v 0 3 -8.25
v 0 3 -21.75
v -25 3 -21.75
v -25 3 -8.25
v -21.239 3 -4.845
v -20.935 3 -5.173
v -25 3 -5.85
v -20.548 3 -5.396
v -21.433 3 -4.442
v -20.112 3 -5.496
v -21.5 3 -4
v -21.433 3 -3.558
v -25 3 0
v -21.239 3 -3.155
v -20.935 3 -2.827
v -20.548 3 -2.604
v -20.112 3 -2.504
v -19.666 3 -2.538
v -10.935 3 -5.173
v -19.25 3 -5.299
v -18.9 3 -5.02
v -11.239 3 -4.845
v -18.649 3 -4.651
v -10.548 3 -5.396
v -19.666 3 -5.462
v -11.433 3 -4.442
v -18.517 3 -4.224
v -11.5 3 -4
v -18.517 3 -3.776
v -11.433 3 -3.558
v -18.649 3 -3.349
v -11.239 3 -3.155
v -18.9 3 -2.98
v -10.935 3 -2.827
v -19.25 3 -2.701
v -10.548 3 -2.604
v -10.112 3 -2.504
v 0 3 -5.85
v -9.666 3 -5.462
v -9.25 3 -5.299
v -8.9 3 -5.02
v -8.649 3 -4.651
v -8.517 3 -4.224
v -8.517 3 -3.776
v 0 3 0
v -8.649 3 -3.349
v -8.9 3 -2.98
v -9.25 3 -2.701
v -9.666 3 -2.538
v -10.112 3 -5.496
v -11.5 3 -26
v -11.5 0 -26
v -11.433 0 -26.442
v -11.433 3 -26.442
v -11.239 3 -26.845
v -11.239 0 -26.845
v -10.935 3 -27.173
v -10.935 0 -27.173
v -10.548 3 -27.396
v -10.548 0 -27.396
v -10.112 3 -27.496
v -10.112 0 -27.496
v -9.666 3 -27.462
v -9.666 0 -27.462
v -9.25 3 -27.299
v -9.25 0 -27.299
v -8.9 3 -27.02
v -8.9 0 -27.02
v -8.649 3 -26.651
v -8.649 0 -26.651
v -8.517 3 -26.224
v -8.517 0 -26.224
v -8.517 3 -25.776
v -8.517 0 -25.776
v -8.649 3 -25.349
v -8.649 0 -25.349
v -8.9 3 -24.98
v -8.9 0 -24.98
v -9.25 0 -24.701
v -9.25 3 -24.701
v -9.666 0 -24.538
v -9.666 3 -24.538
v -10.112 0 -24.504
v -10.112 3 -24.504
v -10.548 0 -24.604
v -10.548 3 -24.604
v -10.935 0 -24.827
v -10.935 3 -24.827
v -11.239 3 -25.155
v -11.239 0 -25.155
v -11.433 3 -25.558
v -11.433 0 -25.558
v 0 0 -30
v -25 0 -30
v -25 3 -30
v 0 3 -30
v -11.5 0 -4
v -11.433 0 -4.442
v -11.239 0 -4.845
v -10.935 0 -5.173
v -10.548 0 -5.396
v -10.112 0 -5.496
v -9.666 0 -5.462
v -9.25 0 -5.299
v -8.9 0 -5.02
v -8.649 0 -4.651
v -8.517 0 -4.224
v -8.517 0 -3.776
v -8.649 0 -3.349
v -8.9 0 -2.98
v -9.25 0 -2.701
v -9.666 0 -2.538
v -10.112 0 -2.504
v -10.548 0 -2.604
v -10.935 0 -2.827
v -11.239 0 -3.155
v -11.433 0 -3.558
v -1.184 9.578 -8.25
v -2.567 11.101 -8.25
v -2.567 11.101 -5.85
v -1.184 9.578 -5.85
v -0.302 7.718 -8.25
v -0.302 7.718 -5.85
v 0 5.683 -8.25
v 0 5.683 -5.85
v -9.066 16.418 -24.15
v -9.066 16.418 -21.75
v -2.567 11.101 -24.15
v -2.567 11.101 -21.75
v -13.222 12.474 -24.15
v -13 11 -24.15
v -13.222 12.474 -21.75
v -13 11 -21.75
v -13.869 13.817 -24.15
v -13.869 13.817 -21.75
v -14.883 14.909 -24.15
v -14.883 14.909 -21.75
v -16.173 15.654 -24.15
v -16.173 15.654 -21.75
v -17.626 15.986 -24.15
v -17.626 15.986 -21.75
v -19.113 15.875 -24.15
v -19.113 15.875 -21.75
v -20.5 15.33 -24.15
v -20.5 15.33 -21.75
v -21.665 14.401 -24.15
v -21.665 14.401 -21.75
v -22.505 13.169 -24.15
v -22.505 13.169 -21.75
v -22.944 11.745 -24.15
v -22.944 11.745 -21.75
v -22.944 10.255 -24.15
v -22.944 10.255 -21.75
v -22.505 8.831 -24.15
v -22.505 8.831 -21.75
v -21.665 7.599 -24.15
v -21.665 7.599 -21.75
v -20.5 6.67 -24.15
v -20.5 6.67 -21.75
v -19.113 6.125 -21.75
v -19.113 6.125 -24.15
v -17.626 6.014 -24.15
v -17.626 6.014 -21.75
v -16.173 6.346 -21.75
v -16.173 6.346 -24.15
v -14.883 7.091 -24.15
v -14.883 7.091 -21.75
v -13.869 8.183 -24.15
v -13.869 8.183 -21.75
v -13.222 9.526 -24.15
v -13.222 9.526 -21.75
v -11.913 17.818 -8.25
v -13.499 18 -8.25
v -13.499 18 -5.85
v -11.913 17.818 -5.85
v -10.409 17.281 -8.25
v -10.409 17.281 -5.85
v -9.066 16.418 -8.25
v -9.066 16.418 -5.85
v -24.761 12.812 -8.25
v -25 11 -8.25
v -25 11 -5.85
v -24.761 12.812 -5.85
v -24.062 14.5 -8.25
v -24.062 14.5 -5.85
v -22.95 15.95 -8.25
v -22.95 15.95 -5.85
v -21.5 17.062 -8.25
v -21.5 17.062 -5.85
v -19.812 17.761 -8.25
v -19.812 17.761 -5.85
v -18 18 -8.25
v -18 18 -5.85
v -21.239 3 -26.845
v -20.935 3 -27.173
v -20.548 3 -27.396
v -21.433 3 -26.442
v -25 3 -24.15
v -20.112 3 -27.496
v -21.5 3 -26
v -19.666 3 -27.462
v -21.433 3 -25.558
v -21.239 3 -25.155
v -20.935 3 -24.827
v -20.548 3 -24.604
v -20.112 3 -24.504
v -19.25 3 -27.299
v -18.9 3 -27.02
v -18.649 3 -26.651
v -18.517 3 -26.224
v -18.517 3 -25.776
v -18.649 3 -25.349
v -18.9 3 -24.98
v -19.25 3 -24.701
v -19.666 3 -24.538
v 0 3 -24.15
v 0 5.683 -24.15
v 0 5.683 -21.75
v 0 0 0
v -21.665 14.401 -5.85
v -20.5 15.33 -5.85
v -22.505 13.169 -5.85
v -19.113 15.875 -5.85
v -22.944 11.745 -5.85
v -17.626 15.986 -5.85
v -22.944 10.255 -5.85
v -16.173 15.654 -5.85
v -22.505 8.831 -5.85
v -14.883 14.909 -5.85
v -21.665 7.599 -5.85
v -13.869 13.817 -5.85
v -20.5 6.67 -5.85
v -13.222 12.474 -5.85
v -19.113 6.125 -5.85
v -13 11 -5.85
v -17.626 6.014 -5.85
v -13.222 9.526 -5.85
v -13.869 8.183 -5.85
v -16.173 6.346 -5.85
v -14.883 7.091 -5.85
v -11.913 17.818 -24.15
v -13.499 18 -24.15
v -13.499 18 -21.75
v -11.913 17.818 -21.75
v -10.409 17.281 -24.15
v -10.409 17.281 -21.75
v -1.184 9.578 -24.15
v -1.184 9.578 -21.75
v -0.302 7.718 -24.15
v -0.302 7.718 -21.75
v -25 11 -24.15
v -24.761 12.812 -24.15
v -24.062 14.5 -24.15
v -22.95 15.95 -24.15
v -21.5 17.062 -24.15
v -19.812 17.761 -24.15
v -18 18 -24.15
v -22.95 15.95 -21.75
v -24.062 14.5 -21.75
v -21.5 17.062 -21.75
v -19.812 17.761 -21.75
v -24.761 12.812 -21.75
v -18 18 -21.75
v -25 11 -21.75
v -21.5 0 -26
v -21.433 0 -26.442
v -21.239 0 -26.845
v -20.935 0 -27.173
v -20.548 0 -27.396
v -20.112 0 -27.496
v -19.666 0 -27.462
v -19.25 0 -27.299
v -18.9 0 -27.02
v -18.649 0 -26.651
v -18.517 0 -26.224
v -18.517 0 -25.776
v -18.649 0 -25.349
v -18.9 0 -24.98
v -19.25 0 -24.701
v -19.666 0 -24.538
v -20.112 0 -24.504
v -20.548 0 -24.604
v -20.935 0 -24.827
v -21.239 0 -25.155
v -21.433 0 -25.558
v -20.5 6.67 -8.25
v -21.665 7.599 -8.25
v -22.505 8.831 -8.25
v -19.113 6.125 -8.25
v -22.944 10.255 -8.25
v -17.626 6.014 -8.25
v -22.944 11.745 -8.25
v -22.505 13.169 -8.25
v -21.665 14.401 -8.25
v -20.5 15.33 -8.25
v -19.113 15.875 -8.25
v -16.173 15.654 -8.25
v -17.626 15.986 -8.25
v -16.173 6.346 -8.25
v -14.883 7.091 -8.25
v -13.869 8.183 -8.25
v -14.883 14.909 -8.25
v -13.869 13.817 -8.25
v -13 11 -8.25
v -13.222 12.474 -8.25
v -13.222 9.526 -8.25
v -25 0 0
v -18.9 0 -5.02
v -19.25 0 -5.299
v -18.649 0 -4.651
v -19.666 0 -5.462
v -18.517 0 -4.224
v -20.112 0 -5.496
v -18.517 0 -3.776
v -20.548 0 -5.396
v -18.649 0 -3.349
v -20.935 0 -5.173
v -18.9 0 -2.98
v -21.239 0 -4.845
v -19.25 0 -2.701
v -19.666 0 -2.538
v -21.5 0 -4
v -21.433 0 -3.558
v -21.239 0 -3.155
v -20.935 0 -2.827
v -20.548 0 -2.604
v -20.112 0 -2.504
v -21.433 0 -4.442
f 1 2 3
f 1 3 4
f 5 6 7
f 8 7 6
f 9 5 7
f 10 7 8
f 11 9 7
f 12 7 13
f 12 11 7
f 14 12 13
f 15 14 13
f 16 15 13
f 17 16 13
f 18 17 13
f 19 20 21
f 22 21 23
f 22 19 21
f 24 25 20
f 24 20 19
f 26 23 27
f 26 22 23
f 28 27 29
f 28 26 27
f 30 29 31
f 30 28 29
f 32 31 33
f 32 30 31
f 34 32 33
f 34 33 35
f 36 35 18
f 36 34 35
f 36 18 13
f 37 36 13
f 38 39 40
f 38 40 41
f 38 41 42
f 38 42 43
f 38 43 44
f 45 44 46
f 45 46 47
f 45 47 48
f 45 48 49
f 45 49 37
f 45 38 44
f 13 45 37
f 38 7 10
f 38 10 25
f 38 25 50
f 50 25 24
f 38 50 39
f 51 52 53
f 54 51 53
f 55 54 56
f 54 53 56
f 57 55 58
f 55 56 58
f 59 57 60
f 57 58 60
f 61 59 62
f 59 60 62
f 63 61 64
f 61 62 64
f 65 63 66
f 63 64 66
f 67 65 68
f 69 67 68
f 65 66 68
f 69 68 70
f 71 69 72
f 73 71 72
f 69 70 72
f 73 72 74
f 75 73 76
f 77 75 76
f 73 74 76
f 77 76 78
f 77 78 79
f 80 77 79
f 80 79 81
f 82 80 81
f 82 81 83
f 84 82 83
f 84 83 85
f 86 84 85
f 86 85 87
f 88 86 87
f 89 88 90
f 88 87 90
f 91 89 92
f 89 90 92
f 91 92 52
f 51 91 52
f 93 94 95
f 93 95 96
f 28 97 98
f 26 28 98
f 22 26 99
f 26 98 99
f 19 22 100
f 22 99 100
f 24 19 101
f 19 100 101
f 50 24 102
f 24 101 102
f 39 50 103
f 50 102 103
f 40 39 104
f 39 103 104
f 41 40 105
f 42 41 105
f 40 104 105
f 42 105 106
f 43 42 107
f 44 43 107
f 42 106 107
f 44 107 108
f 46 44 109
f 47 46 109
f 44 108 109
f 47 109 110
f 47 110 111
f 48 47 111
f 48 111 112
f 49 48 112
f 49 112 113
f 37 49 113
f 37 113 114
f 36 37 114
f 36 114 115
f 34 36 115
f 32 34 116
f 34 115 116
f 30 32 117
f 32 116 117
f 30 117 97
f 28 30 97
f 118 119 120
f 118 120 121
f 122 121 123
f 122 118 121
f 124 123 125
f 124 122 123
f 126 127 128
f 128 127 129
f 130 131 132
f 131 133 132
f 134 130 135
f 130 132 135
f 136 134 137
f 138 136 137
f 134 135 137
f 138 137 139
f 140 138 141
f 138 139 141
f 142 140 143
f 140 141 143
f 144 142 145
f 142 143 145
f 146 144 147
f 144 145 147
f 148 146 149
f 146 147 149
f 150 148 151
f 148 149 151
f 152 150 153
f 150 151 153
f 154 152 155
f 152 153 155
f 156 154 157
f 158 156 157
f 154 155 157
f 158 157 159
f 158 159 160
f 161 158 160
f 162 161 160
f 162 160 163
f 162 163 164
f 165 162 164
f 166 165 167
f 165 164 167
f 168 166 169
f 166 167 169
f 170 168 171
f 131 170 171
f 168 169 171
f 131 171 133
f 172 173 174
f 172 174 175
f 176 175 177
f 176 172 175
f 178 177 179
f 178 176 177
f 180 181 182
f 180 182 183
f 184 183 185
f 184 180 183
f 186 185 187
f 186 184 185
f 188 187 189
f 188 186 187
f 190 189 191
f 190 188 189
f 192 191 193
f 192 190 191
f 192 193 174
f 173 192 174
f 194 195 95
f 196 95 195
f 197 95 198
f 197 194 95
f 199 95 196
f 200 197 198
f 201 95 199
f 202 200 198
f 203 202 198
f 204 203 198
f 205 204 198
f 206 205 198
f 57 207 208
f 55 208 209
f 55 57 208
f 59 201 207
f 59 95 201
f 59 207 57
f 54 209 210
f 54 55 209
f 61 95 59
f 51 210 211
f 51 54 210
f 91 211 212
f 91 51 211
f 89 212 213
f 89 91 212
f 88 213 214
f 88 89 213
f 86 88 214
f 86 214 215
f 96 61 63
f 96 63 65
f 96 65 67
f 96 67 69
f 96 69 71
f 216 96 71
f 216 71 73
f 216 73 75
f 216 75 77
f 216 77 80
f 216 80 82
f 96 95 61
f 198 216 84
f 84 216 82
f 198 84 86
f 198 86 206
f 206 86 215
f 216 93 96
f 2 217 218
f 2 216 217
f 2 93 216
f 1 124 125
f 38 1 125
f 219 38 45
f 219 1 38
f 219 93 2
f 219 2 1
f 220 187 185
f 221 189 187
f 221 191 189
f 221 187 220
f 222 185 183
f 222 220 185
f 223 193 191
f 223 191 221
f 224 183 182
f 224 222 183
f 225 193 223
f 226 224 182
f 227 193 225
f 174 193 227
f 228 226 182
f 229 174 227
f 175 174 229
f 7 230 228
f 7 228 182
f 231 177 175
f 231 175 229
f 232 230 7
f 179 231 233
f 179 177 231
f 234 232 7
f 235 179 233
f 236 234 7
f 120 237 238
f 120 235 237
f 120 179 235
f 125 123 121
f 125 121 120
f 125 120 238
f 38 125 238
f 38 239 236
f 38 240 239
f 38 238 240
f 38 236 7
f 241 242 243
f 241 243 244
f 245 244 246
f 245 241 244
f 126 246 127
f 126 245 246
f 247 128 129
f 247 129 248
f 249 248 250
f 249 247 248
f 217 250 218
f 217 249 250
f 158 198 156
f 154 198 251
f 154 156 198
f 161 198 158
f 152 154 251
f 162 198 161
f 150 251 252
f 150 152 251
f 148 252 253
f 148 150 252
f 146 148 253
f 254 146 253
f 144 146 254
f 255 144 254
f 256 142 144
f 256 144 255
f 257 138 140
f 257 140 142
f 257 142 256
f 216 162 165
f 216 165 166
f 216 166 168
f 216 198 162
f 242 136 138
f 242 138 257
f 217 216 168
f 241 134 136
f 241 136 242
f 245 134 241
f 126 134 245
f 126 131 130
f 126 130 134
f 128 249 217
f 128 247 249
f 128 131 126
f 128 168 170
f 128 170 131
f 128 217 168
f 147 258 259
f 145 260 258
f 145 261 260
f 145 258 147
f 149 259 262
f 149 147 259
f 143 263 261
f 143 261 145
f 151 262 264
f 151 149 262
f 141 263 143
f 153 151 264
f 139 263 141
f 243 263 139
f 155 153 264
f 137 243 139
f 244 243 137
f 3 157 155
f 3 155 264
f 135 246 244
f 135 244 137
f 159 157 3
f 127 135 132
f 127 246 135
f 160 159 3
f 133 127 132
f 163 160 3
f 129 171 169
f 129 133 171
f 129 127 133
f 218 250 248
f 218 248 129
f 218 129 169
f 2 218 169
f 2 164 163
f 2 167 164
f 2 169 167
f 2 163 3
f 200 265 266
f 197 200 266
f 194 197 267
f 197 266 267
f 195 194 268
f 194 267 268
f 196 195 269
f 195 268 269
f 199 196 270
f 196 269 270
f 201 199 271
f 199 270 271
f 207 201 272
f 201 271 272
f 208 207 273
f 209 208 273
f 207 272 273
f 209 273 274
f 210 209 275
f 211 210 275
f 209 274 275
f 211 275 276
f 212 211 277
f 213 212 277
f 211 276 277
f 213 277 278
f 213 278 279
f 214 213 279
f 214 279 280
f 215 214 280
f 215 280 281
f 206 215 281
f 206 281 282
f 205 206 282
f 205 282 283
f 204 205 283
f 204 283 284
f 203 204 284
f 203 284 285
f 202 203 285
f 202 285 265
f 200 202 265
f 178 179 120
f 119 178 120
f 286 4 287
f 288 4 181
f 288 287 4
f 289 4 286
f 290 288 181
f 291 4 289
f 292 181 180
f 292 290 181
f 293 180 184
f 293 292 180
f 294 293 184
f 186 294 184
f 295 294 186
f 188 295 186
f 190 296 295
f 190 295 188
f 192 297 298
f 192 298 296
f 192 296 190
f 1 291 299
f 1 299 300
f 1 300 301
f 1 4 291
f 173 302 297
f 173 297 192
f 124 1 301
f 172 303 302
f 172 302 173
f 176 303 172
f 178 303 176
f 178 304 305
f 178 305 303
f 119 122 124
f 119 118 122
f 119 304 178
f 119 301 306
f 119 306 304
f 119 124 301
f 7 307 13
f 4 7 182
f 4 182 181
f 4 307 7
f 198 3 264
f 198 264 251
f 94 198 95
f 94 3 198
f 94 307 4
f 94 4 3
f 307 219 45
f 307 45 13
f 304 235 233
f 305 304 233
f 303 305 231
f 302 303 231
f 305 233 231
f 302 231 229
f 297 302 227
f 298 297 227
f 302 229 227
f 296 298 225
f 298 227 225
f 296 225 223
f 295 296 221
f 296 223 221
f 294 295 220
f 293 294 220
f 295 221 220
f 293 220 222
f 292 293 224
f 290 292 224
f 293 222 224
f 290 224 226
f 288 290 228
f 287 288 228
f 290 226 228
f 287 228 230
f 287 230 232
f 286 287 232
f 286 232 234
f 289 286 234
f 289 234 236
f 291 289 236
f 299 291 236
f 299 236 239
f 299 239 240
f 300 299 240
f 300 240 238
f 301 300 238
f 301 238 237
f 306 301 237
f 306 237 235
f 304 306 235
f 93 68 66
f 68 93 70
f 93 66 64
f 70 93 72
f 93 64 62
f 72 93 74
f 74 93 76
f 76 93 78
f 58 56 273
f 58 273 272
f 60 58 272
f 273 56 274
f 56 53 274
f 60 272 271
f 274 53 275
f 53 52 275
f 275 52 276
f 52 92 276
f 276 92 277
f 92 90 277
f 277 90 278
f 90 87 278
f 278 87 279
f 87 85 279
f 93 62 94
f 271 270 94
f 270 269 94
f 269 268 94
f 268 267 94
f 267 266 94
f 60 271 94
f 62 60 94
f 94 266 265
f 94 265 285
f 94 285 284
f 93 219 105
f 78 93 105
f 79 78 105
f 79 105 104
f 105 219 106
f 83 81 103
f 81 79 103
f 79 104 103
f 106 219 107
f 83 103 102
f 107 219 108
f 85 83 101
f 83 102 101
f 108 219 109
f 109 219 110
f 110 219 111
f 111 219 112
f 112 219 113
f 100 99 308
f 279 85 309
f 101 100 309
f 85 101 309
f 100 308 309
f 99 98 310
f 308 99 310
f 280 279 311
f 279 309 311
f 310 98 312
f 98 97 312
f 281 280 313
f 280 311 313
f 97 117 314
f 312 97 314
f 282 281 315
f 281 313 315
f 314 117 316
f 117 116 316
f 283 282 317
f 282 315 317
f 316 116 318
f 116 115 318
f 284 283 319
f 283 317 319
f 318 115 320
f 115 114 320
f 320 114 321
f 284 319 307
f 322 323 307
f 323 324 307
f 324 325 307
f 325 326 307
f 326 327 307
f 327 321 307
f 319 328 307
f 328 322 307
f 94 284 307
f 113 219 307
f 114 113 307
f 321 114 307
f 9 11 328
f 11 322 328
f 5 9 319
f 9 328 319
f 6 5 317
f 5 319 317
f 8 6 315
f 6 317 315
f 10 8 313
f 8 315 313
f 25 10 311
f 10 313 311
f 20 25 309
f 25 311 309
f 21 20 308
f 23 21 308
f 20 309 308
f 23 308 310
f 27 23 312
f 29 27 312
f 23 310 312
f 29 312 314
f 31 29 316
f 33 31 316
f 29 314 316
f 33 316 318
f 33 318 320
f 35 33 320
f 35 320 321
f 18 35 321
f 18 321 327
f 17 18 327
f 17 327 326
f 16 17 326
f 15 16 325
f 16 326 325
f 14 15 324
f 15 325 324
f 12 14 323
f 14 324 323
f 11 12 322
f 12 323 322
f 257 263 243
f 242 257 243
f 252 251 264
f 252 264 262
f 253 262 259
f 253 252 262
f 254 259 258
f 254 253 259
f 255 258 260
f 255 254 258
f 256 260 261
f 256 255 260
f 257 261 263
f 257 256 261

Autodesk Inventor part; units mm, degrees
ref_plane "YZ Plane" through (0, 0, 0) normal (1, 0, 0) x (0, 1, 0)
ref_plane "XZ Plane" through (0, 0, 0) normal (0, 1, 0) x (-1, 0, 0)
ref_plane "XY Plane" through (0, 0, 0) normal (0, 0, 1) x (1, 0, 0)
sketch "Sketch1" plane through (0, 0, 0) normal (0, 1, 0) x (-1, 0, 0)
  line L0 (0, 0) -> (25, 0)
  line L1 (25, 0) -> (25, -30)
  line L2 (25, -30) -> (0, -30)
  line L3 (0, -30) -> (0, 0)
  circle A0 centre (20, -4) radius 1.5
  circle A1 centre (20, -26) radius 1.5
  circle A2 centre (10, -4) radius 1.5
  circle A3 centre (10, -26) radius 1.5
  dimension "d0" = 30
  dimension "d1" = 25
  dimension "d2" = 3
  dimension "d5" = 22
  dimension "d8" = 10
  dimension "d11" = 20
  dimension "d12" = 4
extrude "Extrusion1" add sketch "Sketch1" along normal blind 25.5
sketch "Sketch2" plane through (0, 0, 0) normal (1, 0, 0) x (0, 0, -1)
  line L0 (0, 0) -> (30, 0) projected
  line L1 (30, 0) -> (30, 25.5) projected
  line L2 (0, 25.5) -> (30, 25.5) projected
  line L3 (0, 0) -> (0, 25.5) projected
  line L4 (8.25, 25.5) -> (21.75, 25.5)
  line L5 (21.75, 25.5) -> (21.75, 3)
  line L6 (21.75, 3) -> (8.25, 3)
  line L7 (8.25, 3) -> (8.25, 25.5)
  line L8 (30, 25.5) -> (0, 25.5) projected
  line L9 (30, 0) -> (30, 25.5) projected
  line L10 (24.15, 25.5) -> (30, 25.5)
  line L11 (30, 25.5) -> (30, 3)
  line L12 (30, 3) -> (24.15, 3)
  line L13 (24.15, 3) -> (24.15, 25.5)
  line L14 (0, 25.5) -> (5.85, 25.5)
  line L15 (5.85, 25.5) -> (5.85, 3)
  line L16 (5.85, 3) -> (0, 3)
  line L17 (0, 3) -> (0, 25.5)
  point P0 (0, 3)
  point P1 (30, 3)
  dimension "d15" = 3
  dimension "d16" = 3
  dimension "d17" = 3
  dimension "d19" = 13.5
  dimension "d20" = 2.4
  dimension "d21" = 2.4
  dimension "d22" = 5.85
extrude "Extrusion2" cut sketch "Sketch2" against normal blind 25.5 contours L3 L2 L15 L16 | L12 L13 L2 L1 | L2 L5 L6 L7
sketch "Sketch3" plane through (0, 3, -5.85) normal (0, 0, 1) x (1, 0, 0)
  circle A0 centre (-18, 8) radius 5
  line L0 (-25, 0) -> (-25, 22.5) projected
  line L1 (0, 0) -> (-25, 0) projected
  line L2 (0, 22.5) -> (0, 0) projected
  line L3 (-25, 22.5) -> (0, 22.5) projected
  line L4 (-25, 15) -> (-11, 15)
  line L5 (-11, 15) -> (0, 6)
  line L6 (0, 0) -> (0, 22.5) projected
  point P0 (0, -3)
  point P1 (0, 6)
  dimension "d25" = 8
  dimension "d26" = 7
  dimension "d27" = 7
  dimension "d28" = 14
  dimension "d29" = 6
  dimension "d30" = 10
extrude "Extrusion3" cut sketch "Sketch3" against normal blind 25.5 contours A0 | L0 L3 L2 L5 L4
fillet "Fillet1" radius 7 6 edges at (-25, 18, -22.95) (-11, 18, -22.95) (0, 9, -22.95) (-11, 18, -7.05) (0, 9, -7.05) (-25, 18, -7.05)
properties part number "beslag_board_3D"
